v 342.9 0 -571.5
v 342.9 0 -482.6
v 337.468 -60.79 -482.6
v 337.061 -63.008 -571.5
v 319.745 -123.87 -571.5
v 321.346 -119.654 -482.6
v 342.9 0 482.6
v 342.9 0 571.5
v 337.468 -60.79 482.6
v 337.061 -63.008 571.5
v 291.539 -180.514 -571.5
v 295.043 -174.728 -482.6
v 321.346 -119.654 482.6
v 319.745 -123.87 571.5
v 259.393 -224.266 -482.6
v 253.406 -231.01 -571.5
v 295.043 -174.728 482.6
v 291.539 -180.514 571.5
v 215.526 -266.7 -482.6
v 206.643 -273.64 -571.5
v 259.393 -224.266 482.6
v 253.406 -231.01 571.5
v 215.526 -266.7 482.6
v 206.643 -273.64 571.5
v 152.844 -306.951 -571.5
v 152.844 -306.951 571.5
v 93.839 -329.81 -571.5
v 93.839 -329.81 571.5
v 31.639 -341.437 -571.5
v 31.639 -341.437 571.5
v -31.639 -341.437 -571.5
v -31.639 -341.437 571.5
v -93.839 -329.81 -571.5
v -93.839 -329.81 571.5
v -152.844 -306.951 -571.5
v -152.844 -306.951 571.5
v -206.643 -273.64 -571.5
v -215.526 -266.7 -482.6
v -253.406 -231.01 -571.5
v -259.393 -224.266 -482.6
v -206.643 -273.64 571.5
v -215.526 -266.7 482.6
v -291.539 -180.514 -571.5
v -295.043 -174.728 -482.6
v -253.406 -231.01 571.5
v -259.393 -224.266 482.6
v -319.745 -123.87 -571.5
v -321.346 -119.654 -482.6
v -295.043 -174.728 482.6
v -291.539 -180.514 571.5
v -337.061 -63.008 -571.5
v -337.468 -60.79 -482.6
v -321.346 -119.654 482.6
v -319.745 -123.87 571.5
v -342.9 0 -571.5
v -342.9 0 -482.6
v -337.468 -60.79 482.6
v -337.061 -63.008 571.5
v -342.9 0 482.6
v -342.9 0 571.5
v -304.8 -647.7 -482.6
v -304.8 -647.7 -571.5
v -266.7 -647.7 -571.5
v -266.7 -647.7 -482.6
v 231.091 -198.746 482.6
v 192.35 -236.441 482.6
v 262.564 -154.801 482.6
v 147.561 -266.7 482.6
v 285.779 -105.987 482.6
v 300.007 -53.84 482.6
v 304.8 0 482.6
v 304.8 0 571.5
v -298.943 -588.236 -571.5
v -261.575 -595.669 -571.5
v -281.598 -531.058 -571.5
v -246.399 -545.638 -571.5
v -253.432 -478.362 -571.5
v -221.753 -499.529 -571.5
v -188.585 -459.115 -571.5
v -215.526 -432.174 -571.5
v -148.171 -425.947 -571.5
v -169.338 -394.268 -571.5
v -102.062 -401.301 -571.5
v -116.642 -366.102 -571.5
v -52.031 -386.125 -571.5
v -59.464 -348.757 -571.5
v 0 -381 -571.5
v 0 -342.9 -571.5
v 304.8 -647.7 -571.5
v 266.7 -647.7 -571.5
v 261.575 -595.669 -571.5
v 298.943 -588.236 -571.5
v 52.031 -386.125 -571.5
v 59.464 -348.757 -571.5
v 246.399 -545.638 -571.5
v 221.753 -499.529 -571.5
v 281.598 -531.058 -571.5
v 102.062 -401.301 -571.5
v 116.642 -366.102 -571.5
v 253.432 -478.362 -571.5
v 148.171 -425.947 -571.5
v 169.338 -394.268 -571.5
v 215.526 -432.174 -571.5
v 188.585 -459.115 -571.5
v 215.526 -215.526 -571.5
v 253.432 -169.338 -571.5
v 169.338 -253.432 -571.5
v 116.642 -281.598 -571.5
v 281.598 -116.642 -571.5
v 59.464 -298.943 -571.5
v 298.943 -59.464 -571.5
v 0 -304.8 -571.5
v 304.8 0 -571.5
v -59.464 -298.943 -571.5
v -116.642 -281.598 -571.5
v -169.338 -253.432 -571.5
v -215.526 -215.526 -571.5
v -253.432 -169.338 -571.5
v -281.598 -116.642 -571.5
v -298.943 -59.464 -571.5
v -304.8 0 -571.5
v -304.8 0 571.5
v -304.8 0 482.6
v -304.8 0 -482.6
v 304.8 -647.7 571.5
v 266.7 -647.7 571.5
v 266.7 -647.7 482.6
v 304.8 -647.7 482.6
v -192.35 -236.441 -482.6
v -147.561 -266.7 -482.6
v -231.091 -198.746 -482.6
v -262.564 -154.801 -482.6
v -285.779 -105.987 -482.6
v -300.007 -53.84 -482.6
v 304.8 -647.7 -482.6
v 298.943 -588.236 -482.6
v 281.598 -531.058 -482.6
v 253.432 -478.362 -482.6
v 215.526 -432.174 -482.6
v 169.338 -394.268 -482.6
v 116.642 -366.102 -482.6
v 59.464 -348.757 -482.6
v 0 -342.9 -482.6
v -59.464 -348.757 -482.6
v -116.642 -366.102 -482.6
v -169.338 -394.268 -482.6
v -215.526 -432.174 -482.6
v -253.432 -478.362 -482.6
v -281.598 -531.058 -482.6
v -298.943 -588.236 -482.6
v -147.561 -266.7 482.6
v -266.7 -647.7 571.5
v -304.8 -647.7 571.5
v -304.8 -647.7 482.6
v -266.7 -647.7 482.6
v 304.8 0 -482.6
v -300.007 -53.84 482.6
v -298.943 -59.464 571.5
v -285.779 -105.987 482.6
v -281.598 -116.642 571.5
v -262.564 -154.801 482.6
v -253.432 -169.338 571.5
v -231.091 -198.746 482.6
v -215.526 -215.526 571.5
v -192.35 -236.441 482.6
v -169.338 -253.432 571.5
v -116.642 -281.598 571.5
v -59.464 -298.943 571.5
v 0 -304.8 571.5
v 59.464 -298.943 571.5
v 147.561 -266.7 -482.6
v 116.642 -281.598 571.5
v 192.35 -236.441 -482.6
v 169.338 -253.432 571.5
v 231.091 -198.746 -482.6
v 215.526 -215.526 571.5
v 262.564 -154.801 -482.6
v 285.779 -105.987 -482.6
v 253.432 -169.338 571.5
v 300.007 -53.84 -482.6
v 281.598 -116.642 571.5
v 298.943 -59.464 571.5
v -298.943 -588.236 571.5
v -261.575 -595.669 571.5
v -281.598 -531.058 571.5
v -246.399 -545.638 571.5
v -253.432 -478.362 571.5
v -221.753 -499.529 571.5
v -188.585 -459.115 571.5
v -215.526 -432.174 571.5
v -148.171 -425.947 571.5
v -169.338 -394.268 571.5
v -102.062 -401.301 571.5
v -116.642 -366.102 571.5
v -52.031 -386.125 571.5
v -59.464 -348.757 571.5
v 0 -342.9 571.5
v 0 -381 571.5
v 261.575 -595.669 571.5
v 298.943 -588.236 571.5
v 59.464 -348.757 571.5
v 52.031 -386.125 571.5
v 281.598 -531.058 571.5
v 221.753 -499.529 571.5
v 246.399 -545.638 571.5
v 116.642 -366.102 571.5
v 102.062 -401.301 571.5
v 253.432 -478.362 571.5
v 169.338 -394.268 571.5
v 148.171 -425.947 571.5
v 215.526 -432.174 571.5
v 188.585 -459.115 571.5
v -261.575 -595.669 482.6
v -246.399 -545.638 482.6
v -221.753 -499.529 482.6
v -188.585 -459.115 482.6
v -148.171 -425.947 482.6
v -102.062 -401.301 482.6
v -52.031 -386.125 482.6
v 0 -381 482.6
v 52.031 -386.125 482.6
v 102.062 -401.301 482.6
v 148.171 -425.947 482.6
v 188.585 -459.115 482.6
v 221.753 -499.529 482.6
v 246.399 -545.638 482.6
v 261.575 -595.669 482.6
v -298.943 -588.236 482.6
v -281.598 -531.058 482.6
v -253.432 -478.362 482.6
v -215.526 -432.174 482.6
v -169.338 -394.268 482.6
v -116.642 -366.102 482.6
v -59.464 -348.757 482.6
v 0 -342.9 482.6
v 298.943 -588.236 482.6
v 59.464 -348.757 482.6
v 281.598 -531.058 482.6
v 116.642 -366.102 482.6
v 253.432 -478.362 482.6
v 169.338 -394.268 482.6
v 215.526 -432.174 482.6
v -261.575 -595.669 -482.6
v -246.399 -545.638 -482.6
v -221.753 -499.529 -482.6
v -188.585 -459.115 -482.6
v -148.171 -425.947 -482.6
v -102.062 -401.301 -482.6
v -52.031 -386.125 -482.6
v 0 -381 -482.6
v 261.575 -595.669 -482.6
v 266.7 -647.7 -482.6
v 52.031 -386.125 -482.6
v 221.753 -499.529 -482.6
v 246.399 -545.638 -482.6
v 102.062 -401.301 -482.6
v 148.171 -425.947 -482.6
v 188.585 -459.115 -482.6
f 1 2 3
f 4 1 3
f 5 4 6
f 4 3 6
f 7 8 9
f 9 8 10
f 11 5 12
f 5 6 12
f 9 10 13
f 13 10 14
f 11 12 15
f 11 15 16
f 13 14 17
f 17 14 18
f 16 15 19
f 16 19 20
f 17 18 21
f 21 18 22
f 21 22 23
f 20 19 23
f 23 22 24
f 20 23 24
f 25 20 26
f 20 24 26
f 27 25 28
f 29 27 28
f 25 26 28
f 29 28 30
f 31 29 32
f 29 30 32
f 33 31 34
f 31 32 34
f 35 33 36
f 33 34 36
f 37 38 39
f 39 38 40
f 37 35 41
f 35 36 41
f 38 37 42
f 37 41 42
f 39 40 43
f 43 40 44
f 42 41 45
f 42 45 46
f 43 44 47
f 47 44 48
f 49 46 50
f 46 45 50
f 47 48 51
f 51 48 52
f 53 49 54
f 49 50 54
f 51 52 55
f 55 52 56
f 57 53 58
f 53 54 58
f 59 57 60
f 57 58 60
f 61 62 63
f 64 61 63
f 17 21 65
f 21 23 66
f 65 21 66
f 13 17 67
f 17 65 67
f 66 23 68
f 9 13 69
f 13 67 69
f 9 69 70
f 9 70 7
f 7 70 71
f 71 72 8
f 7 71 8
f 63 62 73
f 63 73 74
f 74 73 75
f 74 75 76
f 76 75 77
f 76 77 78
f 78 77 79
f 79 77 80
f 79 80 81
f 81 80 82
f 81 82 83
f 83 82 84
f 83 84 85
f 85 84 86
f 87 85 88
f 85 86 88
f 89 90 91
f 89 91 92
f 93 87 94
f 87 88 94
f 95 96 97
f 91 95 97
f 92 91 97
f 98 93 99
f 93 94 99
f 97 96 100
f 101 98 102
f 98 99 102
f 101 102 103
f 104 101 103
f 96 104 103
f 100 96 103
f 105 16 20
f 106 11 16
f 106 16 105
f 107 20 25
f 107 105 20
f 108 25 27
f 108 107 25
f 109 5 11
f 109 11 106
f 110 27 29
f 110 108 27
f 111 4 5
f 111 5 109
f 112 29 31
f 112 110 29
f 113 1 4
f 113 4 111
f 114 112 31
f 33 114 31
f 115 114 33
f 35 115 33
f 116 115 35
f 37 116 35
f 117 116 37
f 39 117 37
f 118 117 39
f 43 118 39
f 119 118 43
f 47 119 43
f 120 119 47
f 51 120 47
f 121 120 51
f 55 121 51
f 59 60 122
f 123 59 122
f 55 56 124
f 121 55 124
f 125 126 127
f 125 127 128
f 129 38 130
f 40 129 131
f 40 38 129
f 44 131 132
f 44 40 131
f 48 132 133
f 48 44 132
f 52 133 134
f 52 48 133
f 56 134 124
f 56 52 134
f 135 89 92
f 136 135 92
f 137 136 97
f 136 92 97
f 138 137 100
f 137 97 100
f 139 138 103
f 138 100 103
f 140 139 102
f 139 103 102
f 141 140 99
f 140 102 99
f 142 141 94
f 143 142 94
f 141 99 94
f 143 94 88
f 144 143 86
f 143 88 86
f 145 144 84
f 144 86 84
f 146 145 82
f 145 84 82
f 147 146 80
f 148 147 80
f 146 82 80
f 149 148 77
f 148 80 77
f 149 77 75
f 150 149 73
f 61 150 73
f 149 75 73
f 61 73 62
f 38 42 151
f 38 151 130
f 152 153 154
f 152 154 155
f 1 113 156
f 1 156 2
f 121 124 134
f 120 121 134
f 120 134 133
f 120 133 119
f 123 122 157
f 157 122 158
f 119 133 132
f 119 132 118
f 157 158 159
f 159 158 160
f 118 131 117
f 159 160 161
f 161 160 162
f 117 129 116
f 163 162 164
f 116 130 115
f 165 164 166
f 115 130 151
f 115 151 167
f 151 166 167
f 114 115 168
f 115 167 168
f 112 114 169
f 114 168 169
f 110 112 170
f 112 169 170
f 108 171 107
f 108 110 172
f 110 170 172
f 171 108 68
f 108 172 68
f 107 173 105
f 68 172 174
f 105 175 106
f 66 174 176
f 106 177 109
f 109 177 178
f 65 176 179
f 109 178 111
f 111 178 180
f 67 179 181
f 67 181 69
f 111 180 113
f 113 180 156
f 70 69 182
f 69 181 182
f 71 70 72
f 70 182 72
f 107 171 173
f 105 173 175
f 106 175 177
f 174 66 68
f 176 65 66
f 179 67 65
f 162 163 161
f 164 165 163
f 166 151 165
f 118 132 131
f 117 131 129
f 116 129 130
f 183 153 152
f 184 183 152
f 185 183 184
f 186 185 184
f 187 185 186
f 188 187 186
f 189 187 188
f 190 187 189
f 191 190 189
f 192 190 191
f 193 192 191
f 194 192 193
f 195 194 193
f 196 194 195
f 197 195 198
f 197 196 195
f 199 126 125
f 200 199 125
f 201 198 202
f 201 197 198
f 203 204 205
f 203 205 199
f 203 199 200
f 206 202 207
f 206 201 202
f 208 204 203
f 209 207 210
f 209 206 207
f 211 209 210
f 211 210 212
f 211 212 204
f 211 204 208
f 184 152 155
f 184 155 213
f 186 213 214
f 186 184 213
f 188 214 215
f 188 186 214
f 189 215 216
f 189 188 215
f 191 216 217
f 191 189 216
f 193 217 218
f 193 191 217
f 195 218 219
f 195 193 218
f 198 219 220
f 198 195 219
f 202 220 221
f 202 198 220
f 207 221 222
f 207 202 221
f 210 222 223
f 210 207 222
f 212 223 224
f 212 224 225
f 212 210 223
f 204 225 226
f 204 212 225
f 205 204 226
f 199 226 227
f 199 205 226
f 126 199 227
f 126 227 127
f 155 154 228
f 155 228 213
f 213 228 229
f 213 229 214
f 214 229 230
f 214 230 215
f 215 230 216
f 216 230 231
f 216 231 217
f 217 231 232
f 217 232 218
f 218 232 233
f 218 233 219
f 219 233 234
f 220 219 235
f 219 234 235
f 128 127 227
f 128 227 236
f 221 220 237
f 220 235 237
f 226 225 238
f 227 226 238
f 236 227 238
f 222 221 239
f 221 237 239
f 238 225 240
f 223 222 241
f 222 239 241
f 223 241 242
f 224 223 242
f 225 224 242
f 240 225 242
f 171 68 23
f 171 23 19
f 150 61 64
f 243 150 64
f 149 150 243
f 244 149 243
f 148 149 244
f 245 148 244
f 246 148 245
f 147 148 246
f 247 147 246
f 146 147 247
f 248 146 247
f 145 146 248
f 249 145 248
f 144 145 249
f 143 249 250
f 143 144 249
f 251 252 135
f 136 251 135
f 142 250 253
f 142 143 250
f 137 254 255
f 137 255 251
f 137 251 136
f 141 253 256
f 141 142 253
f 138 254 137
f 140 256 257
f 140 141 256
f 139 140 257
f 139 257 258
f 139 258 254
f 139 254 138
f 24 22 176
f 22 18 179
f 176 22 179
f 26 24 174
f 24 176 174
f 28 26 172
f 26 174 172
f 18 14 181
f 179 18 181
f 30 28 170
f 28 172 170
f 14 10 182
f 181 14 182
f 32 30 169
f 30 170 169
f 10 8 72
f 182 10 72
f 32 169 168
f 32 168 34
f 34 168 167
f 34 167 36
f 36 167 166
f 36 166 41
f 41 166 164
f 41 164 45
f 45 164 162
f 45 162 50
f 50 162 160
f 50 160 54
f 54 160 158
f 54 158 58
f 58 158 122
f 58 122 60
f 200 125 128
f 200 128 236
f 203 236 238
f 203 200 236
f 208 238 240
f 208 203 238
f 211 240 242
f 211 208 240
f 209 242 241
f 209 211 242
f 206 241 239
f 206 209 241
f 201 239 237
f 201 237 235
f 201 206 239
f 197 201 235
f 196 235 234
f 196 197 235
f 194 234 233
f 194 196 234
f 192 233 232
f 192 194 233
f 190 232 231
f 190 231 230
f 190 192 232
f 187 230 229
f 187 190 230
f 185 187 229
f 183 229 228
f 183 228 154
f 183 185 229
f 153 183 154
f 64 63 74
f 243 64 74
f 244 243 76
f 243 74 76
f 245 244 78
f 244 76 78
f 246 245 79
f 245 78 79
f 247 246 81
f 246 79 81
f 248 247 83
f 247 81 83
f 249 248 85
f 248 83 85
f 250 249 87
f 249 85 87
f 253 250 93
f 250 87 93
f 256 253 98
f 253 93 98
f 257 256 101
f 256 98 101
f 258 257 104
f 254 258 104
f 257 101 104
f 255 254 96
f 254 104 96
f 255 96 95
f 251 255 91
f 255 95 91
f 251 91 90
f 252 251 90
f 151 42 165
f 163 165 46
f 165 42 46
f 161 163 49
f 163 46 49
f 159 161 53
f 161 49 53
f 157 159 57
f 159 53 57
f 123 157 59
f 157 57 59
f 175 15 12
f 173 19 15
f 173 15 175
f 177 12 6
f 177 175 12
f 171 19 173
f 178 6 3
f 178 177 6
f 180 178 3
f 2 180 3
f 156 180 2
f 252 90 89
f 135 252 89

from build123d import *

# Parameters (mm, degrees)
BOSS_EXTRUDE1_DEPTH     = 571.5
CUT_EXTRUDE1_DEPTH      = 750.515223328
CUT_EXTRUDE1_DEPTH_BACK = 750.515223328
SKETCH2_W               = 965.2
SKETCH2_H               = 266.7
BOSS_EXTRUDE2_DEPTH     = 88.9


with BuildPart() as part:
    # Sketch1 → Boss-Extrude1 (new, symmetric)
    with BuildSketch(Plane.XY):
        with BuildLine():
            Line((-342.9, 0), (-304.8, 0))
            ThreePointArc((-304.8, 0), (0, -304.8), (304.8, 0))
            Line((304.8, 0), (342.9, 0))
            ThreePointArc((342.9, 0), (0, -342.9), (-342.9, 0))
        make_face()
    extrude(amount=BOSS_EXTRUDE1_DEPTH, both=True)

    # Sketch2 → Cut-Extrude1 (cut, two sides: drawn at the far end of the back side and taken through both)
    with BuildSketch(Plane(origin=(0, 0, 0), x_dir=(0, 0, -1), z_dir=(1, 0, 0)).offset(-CUT_EXTRUDE1_DEPTH_BACK)):
        with Locations((0, -133.35)):
            Rectangle(SKETCH2_W, SKETCH2_H)
    extrude(amount=CUT_EXTRUDE1_DEPTH + CUT_EXTRUDE1_DEPTH_BACK, mode=Mode.SUBTRACT)


with BuildPart() as body_2:
    # Sketch3 → Boss-Extrude2 (new body)
    with BuildSketch(Plane.XY.offset(571.5)):
        with BuildLine():
            Line((-304.8, -647.7), (-266.7, -647.7))
            ThreePointArc((-266.7, -647.7), (0, -381), (266.7, -647.7))
            Line((266.7, -647.7), (304.8, -647.7))
            ThreePointArc((304.8, -647.7), (0, -342.9), (-304.8, -647.7))
        make_face()
    extrude(amount=-BOSS_EXTRUDE2_DEPTH)


with BuildPart() as body_3:
    # Mirror4: mirrored copy
    add(body_2.part.mirror(Plane.XY))


solid = Compound([part.part, body_2.part, body_3.part])
